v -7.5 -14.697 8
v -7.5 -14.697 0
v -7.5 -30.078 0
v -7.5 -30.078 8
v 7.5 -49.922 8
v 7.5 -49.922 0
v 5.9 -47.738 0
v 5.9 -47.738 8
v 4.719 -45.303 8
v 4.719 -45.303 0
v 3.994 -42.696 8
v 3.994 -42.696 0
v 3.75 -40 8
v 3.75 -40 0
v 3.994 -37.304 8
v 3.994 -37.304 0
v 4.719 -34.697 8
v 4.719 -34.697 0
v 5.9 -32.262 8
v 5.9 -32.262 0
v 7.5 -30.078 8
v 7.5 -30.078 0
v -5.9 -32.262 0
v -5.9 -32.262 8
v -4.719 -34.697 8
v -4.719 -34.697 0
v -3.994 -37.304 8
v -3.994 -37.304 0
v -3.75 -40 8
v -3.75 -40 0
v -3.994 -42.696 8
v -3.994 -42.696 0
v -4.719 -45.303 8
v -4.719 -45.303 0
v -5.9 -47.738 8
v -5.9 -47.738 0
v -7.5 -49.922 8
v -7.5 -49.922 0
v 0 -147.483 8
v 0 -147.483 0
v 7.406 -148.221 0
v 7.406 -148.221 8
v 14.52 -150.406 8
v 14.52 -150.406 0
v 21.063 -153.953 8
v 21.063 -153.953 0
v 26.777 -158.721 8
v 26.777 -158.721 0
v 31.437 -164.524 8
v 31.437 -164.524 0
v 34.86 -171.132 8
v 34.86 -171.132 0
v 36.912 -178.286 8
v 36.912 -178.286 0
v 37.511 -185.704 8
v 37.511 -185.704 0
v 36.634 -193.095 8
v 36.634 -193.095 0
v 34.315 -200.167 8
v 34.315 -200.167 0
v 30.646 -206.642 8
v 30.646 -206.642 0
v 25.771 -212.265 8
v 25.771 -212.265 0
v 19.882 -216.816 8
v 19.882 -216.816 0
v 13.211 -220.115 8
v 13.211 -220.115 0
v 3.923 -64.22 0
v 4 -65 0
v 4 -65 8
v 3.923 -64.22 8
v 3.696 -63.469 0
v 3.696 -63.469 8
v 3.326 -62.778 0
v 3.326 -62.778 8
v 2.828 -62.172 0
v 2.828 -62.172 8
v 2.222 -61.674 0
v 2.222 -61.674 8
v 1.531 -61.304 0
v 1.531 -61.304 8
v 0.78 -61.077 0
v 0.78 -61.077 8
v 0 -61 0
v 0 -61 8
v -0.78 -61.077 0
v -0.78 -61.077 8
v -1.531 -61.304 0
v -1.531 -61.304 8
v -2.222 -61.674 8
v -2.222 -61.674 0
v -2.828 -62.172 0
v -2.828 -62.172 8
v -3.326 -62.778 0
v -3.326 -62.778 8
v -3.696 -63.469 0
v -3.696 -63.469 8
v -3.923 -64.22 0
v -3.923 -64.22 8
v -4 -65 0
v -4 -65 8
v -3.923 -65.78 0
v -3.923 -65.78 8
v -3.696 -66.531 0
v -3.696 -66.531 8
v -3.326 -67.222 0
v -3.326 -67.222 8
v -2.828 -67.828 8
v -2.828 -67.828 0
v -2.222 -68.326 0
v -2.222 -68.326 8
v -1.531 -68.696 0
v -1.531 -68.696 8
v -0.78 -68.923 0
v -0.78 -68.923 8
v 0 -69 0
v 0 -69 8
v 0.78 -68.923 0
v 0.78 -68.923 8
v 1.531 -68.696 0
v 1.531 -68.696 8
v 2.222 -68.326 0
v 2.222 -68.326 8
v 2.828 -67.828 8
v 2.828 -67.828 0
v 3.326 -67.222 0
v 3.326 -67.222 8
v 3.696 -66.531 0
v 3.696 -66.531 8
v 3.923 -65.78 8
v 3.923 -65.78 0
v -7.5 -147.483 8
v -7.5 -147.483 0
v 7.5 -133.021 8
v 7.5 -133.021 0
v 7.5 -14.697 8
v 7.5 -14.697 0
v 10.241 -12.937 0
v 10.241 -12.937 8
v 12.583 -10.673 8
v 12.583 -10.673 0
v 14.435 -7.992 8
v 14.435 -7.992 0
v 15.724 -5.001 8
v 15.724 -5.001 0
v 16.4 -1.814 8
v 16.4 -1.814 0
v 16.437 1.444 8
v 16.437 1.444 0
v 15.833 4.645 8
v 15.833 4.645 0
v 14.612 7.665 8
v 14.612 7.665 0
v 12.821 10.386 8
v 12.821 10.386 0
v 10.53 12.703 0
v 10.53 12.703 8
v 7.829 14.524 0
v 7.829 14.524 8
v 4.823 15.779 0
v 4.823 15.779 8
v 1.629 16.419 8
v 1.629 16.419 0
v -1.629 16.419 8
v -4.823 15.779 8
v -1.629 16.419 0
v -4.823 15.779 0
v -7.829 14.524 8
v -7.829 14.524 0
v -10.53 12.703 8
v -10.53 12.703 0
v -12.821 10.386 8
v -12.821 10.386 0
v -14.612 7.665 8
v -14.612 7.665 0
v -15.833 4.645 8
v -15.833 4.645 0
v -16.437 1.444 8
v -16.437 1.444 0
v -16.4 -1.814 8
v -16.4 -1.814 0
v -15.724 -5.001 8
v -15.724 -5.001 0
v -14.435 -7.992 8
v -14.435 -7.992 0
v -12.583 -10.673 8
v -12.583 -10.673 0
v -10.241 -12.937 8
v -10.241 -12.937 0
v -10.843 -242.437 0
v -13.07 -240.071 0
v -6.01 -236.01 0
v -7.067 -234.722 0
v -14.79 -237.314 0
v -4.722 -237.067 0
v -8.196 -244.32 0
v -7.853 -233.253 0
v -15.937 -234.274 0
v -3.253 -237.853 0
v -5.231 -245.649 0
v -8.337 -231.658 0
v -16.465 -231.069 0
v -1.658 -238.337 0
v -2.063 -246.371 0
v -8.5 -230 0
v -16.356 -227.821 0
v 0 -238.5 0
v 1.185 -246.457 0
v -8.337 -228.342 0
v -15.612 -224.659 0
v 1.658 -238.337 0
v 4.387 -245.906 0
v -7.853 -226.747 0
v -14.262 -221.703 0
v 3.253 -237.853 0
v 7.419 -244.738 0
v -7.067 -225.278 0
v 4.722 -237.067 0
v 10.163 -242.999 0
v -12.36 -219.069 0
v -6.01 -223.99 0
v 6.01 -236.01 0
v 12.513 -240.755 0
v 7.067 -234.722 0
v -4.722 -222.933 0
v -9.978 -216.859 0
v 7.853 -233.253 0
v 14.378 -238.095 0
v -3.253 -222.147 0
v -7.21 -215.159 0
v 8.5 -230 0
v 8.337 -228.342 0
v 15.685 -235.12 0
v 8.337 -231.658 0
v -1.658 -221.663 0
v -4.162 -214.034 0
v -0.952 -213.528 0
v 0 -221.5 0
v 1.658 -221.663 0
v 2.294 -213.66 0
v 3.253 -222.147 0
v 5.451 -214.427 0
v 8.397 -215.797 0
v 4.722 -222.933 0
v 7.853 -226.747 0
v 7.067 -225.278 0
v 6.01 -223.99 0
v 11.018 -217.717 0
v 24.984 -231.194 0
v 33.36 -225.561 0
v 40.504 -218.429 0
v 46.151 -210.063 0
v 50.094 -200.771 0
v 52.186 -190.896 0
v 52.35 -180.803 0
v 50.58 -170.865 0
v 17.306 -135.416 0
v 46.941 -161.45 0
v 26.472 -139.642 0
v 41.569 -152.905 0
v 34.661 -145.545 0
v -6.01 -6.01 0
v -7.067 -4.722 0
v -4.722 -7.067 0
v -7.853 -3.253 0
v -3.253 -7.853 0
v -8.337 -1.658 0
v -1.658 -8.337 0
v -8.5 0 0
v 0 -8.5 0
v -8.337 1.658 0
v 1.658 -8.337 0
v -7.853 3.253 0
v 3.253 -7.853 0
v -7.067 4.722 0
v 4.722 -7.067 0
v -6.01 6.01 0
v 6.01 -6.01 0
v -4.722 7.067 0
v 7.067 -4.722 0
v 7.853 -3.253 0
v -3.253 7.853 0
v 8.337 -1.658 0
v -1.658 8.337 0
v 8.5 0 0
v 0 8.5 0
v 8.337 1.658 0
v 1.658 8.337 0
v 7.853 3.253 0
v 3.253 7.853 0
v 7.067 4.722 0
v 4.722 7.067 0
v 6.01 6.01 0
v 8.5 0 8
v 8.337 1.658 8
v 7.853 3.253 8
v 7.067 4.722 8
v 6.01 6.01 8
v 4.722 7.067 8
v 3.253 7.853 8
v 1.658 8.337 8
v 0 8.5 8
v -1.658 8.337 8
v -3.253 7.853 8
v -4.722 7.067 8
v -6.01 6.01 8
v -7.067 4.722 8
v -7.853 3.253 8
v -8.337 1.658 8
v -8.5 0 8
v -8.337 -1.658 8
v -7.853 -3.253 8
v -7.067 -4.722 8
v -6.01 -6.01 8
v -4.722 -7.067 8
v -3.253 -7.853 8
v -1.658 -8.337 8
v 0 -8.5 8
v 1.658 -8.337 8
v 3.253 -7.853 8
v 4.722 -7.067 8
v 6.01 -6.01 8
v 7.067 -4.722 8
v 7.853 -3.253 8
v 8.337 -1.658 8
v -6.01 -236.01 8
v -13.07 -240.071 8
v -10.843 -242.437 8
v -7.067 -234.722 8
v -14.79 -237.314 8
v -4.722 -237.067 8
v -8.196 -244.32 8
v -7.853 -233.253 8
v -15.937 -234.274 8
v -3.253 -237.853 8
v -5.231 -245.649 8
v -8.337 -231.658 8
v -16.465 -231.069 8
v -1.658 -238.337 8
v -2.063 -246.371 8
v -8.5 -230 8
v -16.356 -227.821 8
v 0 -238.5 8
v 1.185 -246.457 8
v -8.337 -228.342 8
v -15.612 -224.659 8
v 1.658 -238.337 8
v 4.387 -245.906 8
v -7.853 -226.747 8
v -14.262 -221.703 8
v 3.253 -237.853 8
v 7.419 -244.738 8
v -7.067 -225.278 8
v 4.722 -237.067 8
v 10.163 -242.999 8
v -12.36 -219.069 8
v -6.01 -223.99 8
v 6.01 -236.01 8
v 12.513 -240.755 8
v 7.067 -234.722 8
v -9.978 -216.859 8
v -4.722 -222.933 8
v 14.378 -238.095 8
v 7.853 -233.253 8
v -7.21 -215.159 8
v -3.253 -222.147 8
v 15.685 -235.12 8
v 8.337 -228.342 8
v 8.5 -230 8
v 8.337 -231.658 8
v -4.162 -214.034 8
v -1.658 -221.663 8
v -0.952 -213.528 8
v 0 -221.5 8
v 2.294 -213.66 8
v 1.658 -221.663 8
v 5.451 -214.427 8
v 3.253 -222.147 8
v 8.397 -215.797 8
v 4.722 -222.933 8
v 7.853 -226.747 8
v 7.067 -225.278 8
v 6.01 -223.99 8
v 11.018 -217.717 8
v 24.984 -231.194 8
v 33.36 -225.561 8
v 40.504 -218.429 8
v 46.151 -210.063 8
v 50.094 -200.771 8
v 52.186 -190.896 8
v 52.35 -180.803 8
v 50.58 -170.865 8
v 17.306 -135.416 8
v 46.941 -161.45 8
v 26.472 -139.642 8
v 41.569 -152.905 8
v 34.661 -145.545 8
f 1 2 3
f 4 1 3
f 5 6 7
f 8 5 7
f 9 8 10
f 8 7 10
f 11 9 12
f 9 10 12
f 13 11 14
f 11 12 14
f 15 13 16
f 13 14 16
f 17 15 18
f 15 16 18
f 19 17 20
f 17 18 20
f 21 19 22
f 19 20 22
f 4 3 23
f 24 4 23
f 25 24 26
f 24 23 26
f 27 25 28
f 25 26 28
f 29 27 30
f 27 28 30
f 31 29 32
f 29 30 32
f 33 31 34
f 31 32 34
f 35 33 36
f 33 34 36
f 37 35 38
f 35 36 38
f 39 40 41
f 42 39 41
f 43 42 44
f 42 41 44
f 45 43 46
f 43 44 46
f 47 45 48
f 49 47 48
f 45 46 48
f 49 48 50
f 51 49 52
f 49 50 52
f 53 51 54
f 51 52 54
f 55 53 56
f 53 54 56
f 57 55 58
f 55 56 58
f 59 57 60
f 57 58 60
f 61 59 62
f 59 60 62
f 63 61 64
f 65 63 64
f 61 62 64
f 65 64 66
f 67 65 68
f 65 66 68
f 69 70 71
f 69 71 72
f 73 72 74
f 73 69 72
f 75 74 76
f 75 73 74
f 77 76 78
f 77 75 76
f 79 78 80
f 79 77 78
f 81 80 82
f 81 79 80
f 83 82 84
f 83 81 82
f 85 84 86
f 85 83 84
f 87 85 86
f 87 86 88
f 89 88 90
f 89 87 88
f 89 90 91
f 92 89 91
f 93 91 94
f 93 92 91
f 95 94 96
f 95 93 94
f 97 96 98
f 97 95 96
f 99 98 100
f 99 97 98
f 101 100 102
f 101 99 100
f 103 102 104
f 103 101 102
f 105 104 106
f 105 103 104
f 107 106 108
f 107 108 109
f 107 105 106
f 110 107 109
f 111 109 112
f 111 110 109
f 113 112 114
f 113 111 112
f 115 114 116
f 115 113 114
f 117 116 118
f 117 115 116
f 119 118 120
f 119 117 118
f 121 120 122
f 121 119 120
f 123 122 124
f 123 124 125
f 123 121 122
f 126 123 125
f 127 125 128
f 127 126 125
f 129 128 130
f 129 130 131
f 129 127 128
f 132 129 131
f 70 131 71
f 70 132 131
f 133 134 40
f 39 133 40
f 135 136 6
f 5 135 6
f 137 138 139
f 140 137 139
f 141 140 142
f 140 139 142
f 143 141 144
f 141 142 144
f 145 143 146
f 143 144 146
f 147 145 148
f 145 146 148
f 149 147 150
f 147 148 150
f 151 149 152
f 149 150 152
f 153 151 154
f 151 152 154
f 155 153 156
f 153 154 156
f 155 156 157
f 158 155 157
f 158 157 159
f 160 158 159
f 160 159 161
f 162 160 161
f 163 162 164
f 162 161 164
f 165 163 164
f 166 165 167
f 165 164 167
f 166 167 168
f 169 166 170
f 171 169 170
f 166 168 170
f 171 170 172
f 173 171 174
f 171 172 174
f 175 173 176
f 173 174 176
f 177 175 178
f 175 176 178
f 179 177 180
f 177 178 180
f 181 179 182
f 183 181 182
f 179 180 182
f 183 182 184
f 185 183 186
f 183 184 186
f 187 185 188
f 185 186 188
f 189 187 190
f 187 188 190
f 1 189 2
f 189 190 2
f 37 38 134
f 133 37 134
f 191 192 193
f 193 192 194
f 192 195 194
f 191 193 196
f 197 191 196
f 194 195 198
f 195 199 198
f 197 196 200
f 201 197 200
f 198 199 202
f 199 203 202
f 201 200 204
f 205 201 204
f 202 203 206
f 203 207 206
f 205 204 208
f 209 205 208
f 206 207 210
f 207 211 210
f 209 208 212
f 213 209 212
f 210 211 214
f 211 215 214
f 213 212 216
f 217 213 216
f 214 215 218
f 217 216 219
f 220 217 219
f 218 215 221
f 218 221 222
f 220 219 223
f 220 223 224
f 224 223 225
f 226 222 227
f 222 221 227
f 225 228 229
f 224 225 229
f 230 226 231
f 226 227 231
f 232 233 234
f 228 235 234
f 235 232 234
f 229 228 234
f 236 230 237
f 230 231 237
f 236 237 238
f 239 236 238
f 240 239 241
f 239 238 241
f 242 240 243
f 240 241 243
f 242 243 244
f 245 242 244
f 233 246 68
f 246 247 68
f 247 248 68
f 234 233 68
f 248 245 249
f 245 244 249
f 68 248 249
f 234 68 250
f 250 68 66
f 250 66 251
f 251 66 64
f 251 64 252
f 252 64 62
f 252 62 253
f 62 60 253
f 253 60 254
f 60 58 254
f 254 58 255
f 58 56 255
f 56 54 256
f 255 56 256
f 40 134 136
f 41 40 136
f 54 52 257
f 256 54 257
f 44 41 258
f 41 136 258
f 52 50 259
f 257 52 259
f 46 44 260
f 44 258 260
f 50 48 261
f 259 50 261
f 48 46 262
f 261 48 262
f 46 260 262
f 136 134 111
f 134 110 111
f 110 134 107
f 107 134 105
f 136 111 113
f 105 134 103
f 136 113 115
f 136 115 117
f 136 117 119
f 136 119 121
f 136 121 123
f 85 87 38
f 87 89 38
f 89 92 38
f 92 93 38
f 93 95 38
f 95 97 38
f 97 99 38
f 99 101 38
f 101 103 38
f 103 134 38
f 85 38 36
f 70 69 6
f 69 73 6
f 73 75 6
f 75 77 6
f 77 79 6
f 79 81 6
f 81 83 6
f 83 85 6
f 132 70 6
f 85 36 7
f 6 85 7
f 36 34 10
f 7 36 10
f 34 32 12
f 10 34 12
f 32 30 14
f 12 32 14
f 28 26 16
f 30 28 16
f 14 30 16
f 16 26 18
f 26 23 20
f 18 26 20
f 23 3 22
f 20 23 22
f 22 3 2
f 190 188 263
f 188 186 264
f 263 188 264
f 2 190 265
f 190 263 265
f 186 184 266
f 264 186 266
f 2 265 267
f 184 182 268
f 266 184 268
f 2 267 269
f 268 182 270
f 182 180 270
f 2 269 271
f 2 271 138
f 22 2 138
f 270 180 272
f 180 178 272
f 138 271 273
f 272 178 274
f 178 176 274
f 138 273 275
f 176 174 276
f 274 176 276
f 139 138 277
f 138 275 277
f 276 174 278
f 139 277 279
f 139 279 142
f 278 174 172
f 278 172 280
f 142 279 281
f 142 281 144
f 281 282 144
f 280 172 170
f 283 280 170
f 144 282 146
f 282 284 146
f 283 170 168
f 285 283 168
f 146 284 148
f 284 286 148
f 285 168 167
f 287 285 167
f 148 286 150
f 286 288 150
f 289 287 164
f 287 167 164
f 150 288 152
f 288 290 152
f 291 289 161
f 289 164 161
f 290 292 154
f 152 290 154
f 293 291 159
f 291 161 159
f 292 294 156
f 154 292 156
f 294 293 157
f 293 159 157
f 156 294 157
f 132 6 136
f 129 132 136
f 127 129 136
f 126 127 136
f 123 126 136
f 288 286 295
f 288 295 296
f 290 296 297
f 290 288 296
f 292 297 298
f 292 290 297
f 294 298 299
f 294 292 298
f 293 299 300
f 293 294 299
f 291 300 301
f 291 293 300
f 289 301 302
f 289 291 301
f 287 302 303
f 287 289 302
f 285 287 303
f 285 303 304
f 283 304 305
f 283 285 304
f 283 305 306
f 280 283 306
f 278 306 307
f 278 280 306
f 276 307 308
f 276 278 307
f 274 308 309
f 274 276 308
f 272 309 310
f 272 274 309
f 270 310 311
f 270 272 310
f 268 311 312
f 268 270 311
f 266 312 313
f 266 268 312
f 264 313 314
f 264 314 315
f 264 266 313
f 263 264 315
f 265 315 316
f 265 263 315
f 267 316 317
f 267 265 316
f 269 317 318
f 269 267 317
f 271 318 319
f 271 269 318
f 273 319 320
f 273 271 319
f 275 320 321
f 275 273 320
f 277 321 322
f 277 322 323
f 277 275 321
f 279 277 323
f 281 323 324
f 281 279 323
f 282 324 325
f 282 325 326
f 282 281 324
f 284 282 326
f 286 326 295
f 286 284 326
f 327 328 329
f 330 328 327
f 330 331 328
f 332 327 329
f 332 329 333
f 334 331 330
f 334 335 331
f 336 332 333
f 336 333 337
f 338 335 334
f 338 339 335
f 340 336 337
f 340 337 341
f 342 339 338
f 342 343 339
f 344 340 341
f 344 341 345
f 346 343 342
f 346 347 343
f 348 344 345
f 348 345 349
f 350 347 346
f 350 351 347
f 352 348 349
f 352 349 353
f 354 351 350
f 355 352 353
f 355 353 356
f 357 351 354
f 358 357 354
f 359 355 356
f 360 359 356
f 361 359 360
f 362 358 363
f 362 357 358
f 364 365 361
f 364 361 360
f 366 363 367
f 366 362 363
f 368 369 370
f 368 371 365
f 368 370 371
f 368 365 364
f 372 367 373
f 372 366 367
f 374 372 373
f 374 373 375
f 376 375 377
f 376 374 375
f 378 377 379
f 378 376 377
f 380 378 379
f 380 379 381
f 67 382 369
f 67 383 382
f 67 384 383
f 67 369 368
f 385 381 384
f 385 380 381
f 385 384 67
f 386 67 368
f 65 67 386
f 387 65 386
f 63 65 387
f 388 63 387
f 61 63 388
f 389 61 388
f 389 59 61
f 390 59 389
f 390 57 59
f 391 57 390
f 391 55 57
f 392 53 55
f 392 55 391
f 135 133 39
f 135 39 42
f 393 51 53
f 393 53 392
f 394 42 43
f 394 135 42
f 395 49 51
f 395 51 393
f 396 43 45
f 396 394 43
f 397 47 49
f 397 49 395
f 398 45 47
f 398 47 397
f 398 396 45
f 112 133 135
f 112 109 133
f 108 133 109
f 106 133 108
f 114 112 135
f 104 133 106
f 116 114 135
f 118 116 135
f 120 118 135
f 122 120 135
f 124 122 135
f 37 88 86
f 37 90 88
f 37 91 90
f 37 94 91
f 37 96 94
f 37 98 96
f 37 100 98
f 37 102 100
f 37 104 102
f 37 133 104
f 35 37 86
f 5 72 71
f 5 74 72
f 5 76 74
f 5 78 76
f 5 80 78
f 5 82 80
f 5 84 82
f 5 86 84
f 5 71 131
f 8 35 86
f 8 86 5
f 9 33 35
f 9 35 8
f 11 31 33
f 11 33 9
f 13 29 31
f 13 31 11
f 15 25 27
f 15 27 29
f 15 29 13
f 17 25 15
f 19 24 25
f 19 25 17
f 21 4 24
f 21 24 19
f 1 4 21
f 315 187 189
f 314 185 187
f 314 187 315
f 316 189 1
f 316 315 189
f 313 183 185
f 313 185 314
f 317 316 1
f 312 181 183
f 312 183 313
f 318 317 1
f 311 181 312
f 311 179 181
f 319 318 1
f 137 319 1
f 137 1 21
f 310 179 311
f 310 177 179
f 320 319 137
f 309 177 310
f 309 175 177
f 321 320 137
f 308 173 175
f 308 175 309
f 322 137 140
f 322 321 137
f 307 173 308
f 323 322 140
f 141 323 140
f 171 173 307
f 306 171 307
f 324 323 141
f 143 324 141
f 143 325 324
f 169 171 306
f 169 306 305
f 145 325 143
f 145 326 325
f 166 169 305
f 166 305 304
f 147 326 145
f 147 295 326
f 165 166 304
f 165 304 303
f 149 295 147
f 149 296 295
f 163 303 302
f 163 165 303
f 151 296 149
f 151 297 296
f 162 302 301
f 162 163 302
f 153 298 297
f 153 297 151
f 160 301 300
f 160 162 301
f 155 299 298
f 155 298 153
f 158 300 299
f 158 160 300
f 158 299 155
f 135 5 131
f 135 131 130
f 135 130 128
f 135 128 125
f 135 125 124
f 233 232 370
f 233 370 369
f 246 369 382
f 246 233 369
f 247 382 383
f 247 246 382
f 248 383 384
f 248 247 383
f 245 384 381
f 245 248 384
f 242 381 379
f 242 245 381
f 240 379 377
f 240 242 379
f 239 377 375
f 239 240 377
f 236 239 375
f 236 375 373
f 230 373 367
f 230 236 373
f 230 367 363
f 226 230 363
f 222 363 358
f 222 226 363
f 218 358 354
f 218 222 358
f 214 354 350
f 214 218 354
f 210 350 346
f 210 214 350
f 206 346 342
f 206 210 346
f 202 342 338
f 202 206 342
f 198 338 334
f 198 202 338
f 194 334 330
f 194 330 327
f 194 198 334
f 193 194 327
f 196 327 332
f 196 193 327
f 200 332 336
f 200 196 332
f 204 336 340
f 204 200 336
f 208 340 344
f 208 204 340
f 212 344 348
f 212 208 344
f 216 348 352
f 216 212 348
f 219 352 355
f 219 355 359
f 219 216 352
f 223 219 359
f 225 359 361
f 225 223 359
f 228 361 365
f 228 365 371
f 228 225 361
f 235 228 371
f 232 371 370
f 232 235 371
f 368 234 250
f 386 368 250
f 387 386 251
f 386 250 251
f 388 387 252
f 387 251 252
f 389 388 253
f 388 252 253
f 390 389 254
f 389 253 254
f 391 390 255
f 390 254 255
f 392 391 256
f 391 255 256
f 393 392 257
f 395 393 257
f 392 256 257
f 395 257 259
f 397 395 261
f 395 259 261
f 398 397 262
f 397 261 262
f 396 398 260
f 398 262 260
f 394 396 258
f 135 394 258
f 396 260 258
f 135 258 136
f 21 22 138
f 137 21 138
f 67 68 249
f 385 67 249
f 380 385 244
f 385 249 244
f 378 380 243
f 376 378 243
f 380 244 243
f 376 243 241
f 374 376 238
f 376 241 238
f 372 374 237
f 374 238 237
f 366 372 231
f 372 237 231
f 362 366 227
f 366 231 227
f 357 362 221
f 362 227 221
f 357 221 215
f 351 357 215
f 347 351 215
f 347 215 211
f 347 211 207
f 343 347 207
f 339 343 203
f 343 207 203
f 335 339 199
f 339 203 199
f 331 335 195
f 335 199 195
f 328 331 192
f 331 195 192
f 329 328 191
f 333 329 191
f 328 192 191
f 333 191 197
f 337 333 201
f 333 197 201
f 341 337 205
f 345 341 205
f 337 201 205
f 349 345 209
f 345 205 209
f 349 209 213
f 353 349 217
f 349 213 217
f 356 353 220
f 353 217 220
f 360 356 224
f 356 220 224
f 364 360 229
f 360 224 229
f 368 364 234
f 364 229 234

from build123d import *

# Parameters (mm, degrees)
SKETCH1_R           = 8.5
SKETCH1_R_2         = 4
BOSS_EXTRUDE1_DEPTH = 8


with BuildPart() as part:
    # Sketch1 → Boss-Extrude1 (new body)
    with BuildSketch(Plane.XY):
        with BuildLine():
            ThreePointArc((7.5, -14.696938457), (0, 16.5), (-7.5, -14.696938457))
            Line((-7.5, -14.696938457), (-7.5, -30.078432584))
            ThreePointArc((-7.5, -30.078432584), (-3.75, -40), (-7.5, -49.921567416))
            Line((-7.5, -49.921567416), (-7.5, -147.482509157))
            Line((-7.5, -147.482509157), (0, -147.482509157))
            ThreePointArc((0, -147.482509157), (36.911874913, -178.286162824), (13.210921757, -220.114579102))
            ThreePointArc((13.210921757, -220.114579102), (-16.280138823, -232.684600513), (15.685388352, -235.120409383))
            ThreePointArc((15.685388352, -235.120409383), (52.349526518, -180.803106174), (7.5, -133.020803734))
            Line((7.5, -133.020803734), (7.5, -49.921567416))
            ThreePointArc((7.5, -49.921567416), (3.75, -40), (7.5, -30.078432584))
            Line((7.5, -30.078432584), (7.5, -14.696938457))
        make_face()
        with Locations((0, -230)):
            Circle(SKETCH1_R, mode=Mode.SUBTRACT)
        with Locations((0, -65)):
            Circle(SKETCH1_R_2, mode=Mode.SUBTRACT)
        Circle(SKETCH1_R, mode=Mode.SUBTRACT)
    extrude(amount=BOSS_EXTRUDE1_DEPTH)


solid = part.part
